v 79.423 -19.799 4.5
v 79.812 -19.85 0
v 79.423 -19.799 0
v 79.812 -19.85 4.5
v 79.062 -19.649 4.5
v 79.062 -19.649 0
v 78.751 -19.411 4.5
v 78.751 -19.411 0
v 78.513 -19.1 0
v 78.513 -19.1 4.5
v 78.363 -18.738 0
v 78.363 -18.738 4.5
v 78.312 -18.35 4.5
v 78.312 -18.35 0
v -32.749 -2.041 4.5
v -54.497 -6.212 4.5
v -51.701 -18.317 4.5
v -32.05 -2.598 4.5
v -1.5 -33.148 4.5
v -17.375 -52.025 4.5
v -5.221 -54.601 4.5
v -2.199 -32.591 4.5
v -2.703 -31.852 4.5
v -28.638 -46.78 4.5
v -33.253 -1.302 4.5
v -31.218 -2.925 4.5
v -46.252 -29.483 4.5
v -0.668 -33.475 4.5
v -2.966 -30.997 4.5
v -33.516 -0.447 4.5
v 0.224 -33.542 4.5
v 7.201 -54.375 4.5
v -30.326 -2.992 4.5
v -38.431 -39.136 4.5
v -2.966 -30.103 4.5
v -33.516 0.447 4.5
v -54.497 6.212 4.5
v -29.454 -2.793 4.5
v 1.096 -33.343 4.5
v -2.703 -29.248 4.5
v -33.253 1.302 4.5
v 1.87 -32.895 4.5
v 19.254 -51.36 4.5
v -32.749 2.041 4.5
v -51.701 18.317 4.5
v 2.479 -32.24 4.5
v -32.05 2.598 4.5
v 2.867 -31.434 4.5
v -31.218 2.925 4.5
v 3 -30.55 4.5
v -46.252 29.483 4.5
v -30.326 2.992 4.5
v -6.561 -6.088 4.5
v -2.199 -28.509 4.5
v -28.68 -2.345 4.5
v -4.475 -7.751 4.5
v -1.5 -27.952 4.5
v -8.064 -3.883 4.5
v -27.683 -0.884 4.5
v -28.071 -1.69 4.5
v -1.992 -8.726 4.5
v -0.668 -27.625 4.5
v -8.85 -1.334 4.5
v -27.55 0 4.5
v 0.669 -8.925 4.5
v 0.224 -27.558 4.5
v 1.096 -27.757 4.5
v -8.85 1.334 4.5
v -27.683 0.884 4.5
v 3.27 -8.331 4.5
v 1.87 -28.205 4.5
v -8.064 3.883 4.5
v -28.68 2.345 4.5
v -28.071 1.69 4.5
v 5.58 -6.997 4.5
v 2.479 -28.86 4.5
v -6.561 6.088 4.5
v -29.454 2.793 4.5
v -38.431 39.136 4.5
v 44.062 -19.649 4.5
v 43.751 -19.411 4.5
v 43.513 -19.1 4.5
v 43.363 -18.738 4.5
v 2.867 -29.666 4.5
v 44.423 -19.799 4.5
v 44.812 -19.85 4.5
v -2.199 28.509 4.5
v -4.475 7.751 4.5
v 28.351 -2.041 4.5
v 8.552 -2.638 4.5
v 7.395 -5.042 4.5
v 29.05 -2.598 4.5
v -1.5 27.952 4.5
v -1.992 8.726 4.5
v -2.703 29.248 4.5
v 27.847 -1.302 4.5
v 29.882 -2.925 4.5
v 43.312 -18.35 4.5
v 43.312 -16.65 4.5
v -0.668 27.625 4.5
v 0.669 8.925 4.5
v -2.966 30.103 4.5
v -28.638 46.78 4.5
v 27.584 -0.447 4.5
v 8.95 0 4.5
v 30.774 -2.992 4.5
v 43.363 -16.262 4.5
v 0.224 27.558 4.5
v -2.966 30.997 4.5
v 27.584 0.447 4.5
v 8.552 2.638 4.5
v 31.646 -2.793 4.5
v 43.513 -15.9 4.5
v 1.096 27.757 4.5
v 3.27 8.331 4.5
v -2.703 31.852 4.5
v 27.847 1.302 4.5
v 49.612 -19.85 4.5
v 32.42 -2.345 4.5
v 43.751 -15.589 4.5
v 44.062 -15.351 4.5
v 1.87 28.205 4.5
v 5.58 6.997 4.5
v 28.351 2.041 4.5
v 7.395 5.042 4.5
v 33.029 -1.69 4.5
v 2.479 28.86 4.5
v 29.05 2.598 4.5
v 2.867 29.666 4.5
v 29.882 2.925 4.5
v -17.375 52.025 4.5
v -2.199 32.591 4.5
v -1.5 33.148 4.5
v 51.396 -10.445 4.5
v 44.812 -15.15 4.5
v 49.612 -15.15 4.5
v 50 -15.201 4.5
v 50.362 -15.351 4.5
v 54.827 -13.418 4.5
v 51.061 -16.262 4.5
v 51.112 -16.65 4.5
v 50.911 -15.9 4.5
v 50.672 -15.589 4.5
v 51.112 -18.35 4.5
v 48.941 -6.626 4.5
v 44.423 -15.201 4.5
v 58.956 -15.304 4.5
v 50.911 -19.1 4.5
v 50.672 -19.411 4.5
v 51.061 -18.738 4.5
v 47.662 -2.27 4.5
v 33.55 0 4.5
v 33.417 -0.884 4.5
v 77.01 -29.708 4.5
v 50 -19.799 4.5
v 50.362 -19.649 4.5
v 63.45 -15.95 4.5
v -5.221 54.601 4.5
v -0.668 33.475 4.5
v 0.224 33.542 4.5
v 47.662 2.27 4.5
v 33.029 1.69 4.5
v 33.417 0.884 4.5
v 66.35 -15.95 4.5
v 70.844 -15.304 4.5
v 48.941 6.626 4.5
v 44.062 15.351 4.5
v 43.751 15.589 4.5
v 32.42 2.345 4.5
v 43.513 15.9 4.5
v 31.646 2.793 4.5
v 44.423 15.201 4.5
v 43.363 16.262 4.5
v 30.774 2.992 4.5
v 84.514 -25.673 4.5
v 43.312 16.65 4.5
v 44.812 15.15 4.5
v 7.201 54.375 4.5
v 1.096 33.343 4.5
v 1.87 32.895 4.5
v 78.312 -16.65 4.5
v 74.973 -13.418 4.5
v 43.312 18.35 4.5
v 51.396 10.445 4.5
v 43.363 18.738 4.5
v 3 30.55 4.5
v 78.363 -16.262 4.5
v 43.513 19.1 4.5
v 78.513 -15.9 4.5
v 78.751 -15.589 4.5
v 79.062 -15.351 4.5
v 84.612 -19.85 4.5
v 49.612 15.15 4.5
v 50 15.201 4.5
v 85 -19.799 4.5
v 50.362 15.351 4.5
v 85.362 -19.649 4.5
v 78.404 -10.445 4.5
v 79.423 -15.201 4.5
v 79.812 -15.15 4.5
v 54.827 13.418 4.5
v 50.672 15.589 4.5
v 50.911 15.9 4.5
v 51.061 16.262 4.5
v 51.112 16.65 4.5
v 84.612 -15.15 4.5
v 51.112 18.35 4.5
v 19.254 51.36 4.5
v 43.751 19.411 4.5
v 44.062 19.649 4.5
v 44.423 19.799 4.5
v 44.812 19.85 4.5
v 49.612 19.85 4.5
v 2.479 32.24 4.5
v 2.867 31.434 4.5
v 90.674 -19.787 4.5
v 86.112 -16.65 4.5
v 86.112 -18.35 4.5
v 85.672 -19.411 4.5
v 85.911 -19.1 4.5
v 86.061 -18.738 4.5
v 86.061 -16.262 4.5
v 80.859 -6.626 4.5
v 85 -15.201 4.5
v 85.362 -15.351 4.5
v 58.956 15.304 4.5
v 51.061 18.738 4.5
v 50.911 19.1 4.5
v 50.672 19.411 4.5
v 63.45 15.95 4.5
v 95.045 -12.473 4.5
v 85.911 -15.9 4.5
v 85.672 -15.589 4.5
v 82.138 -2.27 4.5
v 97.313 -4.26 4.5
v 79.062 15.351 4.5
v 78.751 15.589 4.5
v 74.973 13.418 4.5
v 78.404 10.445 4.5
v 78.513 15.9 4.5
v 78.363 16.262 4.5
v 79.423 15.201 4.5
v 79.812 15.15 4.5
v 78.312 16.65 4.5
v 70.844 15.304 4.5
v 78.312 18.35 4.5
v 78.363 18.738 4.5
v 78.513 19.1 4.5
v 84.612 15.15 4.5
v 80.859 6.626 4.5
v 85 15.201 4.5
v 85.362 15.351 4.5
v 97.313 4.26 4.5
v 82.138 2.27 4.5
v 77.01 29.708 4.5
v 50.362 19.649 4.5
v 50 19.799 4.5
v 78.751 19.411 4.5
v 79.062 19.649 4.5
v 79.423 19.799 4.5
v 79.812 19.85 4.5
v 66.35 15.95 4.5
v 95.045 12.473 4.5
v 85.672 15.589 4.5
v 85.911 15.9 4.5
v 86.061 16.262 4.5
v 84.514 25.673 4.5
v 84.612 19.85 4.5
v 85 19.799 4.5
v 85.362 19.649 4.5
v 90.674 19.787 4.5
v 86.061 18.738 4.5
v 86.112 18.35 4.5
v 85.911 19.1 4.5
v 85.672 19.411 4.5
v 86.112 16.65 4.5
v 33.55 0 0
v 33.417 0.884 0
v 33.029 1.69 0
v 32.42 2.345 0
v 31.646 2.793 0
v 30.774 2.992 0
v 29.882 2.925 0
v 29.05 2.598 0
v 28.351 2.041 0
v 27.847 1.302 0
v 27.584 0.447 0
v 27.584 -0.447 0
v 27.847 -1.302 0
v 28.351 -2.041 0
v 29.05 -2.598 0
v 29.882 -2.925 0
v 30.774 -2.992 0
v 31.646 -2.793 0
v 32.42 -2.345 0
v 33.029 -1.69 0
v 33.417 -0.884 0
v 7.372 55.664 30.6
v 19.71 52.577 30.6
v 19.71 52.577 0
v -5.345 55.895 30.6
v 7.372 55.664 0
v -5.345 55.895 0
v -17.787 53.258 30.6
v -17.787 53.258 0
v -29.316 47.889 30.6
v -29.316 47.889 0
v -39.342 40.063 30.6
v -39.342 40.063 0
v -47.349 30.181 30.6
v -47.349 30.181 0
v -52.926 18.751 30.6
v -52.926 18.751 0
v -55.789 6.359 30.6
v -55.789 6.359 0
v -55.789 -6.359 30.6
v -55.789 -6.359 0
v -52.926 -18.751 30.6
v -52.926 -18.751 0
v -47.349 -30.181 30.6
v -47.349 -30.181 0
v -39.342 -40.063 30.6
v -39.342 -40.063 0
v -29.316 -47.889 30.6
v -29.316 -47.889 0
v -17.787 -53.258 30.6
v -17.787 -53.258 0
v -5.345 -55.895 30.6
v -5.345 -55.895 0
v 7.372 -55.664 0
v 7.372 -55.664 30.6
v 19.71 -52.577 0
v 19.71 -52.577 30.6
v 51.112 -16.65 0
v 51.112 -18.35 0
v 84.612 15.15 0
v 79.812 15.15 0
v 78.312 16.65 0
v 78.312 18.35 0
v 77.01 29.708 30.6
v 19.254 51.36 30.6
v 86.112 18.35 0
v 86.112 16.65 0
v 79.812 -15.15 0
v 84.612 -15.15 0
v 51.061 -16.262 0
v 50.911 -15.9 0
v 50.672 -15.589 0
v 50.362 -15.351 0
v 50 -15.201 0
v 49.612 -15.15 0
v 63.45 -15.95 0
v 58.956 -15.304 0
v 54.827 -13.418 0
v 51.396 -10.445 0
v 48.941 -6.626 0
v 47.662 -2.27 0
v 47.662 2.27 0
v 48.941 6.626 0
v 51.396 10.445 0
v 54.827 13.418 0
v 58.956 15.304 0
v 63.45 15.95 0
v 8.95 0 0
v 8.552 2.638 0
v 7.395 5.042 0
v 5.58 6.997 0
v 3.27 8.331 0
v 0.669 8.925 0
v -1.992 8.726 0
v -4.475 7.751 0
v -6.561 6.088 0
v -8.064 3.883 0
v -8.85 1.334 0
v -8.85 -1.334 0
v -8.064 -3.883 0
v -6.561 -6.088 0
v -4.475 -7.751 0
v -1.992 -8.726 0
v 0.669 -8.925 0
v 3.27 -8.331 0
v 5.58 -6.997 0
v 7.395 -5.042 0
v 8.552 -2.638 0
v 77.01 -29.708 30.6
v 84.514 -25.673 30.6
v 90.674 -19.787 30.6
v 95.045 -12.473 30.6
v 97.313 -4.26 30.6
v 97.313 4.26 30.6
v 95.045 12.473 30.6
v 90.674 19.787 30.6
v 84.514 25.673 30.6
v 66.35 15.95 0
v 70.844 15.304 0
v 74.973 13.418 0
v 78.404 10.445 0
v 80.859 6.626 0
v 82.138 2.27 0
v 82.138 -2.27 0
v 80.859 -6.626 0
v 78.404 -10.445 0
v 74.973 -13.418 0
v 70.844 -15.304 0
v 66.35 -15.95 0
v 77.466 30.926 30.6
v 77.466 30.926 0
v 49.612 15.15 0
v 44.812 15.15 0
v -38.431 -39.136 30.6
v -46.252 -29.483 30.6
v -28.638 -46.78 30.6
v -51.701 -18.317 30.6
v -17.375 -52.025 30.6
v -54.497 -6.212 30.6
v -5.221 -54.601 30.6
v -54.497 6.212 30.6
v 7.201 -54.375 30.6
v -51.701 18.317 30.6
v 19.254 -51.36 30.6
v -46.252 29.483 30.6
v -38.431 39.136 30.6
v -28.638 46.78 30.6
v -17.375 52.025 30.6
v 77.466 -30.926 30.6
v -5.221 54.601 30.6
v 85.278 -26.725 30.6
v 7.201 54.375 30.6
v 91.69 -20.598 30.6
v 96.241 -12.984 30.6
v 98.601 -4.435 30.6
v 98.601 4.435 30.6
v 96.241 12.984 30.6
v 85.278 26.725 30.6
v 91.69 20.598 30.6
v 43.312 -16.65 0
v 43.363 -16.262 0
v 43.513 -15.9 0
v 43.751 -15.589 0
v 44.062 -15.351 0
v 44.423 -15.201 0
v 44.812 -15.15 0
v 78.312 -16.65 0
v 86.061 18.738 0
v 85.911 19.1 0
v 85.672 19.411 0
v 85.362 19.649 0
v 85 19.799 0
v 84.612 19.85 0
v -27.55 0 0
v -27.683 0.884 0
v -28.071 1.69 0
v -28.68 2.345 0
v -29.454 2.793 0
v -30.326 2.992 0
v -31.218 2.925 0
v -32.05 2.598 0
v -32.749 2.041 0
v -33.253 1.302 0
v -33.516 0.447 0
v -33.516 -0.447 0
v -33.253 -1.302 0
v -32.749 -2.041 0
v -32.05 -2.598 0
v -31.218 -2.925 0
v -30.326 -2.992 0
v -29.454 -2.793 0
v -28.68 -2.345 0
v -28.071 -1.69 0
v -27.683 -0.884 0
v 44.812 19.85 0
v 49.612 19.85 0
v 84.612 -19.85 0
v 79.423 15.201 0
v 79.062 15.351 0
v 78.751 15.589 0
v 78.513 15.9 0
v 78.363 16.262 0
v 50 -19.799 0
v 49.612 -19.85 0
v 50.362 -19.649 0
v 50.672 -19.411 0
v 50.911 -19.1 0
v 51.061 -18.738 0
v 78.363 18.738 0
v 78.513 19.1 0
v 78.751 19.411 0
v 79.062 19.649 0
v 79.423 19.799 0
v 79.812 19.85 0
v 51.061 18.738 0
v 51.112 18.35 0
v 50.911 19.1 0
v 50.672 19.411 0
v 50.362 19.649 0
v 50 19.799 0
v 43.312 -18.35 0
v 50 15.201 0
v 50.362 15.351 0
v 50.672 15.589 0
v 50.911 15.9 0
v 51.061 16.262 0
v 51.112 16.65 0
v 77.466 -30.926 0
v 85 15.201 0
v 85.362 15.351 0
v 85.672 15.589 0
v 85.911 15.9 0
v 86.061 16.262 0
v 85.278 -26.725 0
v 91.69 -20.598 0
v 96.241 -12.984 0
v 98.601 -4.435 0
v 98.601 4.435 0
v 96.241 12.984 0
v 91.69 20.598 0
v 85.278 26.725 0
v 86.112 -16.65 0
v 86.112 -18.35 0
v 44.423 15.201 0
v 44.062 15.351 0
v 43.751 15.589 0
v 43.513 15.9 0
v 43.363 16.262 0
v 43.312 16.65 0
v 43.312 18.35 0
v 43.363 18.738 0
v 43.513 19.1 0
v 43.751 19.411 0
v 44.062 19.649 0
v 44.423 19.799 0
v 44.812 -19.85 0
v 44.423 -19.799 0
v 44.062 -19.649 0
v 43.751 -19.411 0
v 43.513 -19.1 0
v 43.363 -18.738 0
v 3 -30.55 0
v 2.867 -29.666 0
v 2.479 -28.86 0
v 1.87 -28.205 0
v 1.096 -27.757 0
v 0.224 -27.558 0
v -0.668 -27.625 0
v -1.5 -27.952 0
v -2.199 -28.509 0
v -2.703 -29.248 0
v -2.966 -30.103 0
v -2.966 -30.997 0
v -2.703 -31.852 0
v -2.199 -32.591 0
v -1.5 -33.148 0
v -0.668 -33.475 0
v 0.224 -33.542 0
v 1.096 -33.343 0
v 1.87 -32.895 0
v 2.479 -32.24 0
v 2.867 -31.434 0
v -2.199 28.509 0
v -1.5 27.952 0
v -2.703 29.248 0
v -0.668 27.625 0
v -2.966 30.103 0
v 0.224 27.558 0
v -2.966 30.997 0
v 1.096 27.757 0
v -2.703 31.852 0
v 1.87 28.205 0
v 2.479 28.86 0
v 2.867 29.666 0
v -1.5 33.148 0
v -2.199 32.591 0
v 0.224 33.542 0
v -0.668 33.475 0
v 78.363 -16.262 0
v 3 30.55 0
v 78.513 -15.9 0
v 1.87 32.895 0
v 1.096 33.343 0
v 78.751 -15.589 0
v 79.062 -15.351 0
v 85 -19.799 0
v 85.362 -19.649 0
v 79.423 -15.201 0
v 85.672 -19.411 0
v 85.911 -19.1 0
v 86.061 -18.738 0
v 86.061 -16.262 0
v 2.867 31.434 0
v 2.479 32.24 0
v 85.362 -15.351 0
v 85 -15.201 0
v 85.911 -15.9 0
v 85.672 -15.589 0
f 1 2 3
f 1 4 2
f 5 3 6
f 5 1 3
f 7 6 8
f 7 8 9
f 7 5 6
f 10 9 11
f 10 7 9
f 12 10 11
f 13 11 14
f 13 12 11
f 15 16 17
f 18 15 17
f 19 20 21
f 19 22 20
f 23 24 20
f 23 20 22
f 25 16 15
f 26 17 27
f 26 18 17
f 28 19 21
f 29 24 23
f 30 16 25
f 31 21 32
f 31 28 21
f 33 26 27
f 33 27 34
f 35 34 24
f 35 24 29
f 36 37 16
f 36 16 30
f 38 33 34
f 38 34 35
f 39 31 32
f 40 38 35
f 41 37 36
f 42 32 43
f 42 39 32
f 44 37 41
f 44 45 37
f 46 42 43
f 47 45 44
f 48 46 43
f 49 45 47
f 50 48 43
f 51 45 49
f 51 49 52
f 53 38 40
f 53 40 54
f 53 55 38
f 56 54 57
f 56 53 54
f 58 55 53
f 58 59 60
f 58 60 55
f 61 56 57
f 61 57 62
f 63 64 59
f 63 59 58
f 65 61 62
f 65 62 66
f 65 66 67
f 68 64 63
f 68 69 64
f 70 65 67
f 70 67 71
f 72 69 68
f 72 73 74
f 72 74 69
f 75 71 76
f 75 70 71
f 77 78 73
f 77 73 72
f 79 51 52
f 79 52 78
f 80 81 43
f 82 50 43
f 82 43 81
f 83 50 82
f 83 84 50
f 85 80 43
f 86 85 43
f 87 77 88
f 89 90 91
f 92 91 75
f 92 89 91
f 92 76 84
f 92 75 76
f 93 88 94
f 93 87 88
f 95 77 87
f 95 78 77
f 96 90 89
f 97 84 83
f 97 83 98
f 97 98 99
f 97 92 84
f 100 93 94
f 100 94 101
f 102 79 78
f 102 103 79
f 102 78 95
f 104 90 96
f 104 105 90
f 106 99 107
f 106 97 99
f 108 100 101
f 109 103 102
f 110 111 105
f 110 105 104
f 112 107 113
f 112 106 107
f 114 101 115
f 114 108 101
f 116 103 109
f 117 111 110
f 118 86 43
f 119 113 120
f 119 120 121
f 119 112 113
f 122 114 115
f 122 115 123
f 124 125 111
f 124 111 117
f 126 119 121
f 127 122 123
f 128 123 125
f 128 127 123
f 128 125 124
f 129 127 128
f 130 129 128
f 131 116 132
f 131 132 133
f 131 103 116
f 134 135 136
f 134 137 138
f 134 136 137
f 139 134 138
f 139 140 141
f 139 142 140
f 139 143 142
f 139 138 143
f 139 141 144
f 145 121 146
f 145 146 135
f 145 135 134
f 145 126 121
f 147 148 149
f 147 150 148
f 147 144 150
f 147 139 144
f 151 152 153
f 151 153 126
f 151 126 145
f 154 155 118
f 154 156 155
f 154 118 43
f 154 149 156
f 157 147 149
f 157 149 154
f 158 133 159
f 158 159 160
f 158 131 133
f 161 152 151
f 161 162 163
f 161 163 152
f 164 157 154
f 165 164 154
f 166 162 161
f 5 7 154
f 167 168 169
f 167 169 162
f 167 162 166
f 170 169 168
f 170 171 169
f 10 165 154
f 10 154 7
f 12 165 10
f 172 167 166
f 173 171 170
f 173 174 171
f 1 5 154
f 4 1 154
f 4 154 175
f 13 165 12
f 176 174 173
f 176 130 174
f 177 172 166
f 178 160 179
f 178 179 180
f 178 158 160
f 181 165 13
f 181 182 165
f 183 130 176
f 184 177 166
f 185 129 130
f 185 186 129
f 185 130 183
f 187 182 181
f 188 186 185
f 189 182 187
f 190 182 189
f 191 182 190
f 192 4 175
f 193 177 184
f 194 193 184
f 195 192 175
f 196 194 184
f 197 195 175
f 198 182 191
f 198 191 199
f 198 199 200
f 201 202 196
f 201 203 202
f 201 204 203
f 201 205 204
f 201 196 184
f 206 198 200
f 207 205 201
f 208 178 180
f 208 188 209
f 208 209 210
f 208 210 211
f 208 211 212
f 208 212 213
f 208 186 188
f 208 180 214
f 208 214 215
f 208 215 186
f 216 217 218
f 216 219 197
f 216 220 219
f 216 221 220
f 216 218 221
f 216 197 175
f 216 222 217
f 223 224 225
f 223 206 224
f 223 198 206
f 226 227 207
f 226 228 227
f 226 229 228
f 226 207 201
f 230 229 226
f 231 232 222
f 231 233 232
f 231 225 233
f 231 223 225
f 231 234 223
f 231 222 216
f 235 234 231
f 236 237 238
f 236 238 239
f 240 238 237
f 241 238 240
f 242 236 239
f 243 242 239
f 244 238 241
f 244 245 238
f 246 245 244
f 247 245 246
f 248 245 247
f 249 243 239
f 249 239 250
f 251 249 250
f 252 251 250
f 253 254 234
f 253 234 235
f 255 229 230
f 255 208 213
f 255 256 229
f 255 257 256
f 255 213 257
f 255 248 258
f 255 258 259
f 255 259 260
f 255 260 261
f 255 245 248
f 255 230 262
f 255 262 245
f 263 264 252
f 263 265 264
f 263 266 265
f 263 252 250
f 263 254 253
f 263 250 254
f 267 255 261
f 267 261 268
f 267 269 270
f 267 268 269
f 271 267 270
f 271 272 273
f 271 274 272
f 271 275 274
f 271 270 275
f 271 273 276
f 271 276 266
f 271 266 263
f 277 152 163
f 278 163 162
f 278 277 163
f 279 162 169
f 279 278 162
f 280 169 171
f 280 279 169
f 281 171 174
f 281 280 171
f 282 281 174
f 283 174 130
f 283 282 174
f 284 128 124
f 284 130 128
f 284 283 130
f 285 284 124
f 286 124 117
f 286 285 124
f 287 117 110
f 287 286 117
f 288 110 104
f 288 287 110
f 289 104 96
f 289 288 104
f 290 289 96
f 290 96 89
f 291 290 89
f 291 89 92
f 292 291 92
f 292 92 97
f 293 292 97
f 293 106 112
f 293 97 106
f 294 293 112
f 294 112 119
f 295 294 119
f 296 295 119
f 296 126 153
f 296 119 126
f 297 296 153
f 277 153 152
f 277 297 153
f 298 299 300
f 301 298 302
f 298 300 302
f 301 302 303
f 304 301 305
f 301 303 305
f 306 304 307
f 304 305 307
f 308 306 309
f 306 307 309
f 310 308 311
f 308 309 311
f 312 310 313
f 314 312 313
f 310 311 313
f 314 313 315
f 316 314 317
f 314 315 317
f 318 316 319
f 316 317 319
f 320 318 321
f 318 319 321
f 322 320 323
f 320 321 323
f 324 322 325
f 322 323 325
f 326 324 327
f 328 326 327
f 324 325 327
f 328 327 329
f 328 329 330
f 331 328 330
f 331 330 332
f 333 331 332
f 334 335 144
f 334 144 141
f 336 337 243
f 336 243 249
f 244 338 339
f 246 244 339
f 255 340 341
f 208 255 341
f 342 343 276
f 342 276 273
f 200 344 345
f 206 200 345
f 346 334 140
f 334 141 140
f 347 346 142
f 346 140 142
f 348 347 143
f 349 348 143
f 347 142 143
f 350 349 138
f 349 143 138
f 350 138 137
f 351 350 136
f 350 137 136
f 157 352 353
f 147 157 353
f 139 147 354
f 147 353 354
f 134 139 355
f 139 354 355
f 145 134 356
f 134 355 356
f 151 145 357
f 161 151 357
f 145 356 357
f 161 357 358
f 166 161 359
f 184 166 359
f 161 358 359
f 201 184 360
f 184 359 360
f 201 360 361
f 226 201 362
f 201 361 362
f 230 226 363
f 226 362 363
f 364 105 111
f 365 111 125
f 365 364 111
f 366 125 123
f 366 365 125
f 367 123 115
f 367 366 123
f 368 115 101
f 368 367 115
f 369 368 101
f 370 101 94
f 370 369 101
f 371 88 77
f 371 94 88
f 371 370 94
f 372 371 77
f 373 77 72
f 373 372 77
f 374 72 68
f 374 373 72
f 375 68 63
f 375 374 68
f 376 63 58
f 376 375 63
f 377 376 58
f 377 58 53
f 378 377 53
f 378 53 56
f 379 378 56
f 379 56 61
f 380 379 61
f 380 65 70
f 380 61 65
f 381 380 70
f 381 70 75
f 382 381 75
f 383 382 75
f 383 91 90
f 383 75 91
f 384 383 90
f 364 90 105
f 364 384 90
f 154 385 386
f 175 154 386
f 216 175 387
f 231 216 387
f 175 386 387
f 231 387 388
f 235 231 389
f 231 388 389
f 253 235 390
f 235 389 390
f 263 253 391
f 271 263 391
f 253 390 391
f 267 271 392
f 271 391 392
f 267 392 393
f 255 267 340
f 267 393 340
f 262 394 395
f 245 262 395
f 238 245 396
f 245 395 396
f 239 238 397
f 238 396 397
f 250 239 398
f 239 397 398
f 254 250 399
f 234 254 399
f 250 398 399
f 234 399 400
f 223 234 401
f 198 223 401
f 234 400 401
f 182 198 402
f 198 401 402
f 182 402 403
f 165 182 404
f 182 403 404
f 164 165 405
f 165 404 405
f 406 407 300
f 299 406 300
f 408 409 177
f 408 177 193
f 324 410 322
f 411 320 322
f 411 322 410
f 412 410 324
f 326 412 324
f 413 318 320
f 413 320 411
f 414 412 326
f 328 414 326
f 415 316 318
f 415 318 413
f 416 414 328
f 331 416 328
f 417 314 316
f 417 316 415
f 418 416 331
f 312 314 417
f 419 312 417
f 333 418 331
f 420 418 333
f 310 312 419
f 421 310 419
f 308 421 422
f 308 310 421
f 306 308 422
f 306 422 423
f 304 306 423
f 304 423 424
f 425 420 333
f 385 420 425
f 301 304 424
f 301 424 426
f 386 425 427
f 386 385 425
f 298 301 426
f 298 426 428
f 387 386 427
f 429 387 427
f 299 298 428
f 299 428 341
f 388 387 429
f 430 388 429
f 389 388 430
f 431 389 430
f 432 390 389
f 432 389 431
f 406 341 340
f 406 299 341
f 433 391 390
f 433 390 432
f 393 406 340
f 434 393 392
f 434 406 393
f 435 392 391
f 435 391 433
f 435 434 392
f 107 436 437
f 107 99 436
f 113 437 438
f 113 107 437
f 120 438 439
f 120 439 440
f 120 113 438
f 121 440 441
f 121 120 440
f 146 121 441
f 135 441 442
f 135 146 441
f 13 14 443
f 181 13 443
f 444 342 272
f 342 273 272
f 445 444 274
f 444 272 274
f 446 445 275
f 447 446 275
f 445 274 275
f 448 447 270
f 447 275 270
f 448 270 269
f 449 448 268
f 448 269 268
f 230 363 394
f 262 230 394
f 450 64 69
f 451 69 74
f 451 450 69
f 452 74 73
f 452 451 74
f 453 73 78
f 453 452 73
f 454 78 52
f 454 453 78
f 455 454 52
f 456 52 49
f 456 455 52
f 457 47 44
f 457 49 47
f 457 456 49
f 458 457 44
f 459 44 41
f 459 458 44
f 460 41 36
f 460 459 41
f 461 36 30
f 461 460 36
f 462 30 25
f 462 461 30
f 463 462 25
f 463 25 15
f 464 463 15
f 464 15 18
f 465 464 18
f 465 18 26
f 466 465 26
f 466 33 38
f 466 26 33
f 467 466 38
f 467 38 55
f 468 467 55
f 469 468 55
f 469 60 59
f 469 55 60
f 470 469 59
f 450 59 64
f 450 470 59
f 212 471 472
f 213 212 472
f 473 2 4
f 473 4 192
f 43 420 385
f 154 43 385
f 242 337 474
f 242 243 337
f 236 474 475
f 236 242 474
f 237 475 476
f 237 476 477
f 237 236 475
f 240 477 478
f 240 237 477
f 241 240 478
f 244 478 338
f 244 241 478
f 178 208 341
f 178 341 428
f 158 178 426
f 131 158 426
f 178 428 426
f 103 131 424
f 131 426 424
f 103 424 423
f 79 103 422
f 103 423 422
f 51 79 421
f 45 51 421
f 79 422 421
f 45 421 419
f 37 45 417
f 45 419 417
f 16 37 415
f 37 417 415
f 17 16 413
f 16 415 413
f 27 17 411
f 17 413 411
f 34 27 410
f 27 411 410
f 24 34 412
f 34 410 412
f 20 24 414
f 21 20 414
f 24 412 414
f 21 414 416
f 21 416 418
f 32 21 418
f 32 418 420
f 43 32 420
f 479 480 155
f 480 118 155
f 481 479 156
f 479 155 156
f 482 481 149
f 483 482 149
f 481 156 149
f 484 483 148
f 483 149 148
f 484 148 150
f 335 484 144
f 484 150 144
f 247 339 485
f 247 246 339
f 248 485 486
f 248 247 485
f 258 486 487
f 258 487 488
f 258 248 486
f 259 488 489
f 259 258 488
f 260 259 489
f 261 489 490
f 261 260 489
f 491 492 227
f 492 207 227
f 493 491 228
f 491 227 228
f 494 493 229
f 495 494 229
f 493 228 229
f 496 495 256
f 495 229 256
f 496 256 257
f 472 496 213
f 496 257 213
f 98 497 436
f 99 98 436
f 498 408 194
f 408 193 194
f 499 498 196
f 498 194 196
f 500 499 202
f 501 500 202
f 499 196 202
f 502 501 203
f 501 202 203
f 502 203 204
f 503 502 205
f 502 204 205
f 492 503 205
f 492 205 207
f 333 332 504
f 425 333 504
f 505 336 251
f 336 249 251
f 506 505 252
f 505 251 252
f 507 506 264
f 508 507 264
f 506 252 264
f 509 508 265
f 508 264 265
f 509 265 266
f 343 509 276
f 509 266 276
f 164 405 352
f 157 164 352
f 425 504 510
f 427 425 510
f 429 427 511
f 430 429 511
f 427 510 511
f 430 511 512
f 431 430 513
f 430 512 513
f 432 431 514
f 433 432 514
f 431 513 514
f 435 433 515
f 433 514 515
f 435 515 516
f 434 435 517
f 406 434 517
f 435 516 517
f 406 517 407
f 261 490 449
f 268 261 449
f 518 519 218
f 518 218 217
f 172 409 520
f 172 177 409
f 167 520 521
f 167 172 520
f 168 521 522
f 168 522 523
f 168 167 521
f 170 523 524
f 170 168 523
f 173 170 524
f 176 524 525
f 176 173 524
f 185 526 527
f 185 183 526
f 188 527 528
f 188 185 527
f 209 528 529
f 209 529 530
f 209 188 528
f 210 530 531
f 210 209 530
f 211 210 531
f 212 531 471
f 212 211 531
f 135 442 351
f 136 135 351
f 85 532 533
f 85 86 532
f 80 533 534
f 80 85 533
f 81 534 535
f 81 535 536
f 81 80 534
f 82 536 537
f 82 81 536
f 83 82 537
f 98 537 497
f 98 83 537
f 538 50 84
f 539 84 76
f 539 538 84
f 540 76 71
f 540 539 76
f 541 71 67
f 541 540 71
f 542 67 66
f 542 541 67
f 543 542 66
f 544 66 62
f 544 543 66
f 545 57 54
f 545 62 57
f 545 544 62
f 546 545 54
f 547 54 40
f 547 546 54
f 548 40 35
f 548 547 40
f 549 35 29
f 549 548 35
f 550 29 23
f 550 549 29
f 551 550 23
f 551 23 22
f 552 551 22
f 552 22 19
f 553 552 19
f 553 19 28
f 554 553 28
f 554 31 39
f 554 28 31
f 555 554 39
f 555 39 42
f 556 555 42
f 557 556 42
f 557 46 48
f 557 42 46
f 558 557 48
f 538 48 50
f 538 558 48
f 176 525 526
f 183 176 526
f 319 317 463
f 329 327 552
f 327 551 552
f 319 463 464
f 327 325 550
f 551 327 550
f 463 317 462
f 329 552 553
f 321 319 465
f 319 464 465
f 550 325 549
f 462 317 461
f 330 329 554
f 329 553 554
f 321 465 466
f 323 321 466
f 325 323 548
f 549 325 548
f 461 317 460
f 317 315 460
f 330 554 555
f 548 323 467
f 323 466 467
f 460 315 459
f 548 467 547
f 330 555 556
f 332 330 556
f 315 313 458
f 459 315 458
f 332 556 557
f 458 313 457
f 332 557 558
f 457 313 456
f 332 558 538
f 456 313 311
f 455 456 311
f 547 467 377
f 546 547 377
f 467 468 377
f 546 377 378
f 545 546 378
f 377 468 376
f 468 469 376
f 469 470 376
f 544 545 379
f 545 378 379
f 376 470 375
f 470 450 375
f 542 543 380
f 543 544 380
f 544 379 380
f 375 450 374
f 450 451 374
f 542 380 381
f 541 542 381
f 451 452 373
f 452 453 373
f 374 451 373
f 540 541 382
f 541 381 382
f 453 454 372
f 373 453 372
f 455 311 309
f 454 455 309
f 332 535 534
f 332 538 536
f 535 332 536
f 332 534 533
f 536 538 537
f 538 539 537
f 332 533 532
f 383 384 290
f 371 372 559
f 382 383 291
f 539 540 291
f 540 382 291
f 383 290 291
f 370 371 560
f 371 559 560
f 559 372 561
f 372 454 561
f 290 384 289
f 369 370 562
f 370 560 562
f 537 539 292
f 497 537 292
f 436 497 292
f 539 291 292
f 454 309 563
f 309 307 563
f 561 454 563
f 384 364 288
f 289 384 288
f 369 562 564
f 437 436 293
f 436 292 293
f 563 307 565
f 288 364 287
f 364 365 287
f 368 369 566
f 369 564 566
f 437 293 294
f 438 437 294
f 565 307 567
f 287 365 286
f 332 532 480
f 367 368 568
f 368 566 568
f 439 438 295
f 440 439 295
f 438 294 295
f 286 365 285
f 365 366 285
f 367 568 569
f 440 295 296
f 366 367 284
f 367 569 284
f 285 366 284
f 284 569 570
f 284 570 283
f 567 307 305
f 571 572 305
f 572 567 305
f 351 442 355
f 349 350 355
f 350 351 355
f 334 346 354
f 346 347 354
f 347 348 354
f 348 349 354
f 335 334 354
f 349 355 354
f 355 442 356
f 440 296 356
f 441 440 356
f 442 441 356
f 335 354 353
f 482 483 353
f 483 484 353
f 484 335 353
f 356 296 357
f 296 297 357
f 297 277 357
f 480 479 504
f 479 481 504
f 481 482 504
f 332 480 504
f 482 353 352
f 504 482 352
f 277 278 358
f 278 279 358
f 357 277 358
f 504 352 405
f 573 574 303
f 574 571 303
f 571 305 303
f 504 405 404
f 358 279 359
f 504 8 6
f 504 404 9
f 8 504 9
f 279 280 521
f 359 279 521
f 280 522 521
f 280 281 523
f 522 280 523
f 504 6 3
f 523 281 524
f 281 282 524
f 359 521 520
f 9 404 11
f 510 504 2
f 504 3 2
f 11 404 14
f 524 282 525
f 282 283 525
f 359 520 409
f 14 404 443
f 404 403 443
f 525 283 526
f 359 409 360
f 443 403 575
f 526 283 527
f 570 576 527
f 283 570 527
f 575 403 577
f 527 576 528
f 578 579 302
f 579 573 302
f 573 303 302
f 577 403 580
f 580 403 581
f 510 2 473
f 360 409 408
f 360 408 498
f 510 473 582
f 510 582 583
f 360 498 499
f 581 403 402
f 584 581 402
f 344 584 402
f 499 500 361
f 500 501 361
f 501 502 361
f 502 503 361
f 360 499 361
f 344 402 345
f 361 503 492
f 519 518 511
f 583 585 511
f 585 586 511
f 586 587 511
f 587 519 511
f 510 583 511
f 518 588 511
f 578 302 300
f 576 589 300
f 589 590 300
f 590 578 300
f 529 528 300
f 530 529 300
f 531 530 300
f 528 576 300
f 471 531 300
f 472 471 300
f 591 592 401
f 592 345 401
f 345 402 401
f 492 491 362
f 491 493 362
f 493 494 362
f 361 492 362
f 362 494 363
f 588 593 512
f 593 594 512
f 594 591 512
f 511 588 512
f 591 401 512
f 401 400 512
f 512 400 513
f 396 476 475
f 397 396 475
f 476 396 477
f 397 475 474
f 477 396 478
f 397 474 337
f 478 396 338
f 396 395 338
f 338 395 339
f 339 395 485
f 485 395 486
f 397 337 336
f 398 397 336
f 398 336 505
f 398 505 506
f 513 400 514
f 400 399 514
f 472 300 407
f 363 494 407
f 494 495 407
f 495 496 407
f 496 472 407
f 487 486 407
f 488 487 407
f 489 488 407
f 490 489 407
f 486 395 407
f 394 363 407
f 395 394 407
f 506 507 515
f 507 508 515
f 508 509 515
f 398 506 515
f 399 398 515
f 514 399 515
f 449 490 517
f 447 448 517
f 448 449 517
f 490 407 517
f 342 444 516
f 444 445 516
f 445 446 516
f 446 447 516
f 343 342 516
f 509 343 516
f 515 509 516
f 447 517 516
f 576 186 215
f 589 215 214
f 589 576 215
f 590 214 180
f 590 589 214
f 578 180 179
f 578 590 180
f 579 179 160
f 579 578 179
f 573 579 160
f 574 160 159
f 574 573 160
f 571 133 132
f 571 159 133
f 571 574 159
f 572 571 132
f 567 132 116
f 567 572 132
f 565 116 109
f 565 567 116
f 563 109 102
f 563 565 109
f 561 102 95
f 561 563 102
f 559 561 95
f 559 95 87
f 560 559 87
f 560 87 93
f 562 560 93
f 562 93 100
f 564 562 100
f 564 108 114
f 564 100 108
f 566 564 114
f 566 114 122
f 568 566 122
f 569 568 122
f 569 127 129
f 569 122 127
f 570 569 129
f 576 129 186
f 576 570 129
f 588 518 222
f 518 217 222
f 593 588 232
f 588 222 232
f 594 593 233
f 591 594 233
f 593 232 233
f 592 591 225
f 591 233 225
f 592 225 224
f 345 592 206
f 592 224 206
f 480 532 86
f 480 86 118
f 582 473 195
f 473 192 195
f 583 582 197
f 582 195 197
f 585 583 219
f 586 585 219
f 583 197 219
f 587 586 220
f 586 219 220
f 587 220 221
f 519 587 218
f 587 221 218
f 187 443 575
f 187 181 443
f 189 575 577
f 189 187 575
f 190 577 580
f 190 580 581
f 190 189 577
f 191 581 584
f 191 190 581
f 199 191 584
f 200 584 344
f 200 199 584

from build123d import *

# Parameters (mm, degrees)
SKETCH1_R           = 3
SKETCH1_W           = 7.8
SKETCH1_H           = 4.7
SKETCH1_R_2         = 8.95
BOSS_EXTRUDE1_DEPTH = 30.6
CUT_EXTRUDE1_DEPTH  = 26.1
FILETE1_R           = 1.5


with BuildPart() as part:
    # Sketch1 → Boss-Extrude1 (new body)
    with BuildSketch(Plane.XY):
        with BuildLine():
            ThreePointArc((77.466015174, -30.925650144), (98.9, 0), (77.466015174, 30.925650144))
            Line((77.466015174, 30.925650144), (19.70985088, 52.577031851))
            ThreePointArc((19.70985088, 52.577031851), (-56.15, 0), (19.70985088, -52.577031851))
            Line((19.70985088, -52.577031851), (77.466015174, -30.925650144))
        make_face()
        with BuildLine():
            Line((63.45, 15.95), (66.35, 15.95))
            ThreePointArc((66.35, 15.95), (82.3, 0), (66.35, -15.95))
            Line((66.35, -15.95), (63.45, -15.95))
            ThreePointArc((63.45, -15.95), (47.5, 0), (63.45, 15.95))
        make_face(mode=Mode.SUBTRACT)
        with Locations((30.55, 0)):
            Circle(SKETCH1_R, mode=Mode.SUBTRACT)
        with Locations((82.211647497, -17.5)):
            Rectangle(SKETCH1_W, SKETCH1_H, mode=Mode.SUBTRACT)
        with Locations((82.211647497, 17.5)):
            Rectangle(SKETCH1_W, SKETCH1_H, mode=Mode.SUBTRACT)
        with Locations((47.211647497, 17.5)):
            Rectangle(SKETCH1_W, SKETCH1_H, mode=Mode.SUBTRACT)
        with Locations((47.211647497, -17.5)):
            Rectangle(SKETCH1_W, SKETCH1_H, mode=Mode.SUBTRACT)
        Circle(SKETCH1_R_2, mode=Mode.SUBTRACT)
        with Locations((0, 30.55)):
            Circle(SKETCH1_R, mode=Mode.SUBTRACT)
        with Locations((0, -30.55)):
            Circle(SKETCH1_R, mode=Mode.SUBTRACT)
        with Locations((-30.55, 0)):
            Circle(SKETCH1_R, mode=Mode.SUBTRACT)
    extrude(amount=BOSS_EXTRUDE1_DEPTH)

    # Sketch2 → Cut-Extrude1 (cut)
    with BuildSketch(Plane.XY.offset(30.6)):
        with BuildLine():
            Line((77.009687371, 29.70837247), (19.253523077, 51.359754177))
            ThreePointArc((19.253523077, 51.359754177), (-54.85, 0), (19.253523077, -51.359754177))
            Line((19.253523077, -51.359754177), (77.009687371, -29.70837247))
            ThreePointArc((77.009687371, -29.70837247), (97.6, 0), (77.009687371, 29.70837247))
        make_face()
    extrude(amount=-CUT_EXTRUDE1_DEPTH, mode=Mode.SUBTRACT)

    # Filete1
    filete1_edges = [part.edges().sort_by_distance(p)[0] for p in [
        (51.111647497, -19.85, 2.25),
        (51.111647497, -15.15, 2.25),
        (86.111647497, -19.85, 2.25),
        (86.111647497, -15.15, 2.25),
        (51.111647497, 15.15, 2.25),
        (51.111647497, 19.85, 2.25),
        (43.311647497, -15.15, 2.25),
        (43.311647497, -19.85, 2.25),
        (78.311647497, -15.15, 2.25),
        (78.311647497, -19.85, 2.25),
        (86.111647497, 15.15, 2.25),
        (86.111647497, 19.85, 2.25),
        (78.311647497, 19.85, 2.25),
        (78.311647497, 15.15, 2.25),
        (43.311647497, 19.85, 2.25),
        (43.311647497, 15.15, 2.25),
    ]]
    fillet(filete1_edges, radius=FILETE1_R)


solid = part.part
